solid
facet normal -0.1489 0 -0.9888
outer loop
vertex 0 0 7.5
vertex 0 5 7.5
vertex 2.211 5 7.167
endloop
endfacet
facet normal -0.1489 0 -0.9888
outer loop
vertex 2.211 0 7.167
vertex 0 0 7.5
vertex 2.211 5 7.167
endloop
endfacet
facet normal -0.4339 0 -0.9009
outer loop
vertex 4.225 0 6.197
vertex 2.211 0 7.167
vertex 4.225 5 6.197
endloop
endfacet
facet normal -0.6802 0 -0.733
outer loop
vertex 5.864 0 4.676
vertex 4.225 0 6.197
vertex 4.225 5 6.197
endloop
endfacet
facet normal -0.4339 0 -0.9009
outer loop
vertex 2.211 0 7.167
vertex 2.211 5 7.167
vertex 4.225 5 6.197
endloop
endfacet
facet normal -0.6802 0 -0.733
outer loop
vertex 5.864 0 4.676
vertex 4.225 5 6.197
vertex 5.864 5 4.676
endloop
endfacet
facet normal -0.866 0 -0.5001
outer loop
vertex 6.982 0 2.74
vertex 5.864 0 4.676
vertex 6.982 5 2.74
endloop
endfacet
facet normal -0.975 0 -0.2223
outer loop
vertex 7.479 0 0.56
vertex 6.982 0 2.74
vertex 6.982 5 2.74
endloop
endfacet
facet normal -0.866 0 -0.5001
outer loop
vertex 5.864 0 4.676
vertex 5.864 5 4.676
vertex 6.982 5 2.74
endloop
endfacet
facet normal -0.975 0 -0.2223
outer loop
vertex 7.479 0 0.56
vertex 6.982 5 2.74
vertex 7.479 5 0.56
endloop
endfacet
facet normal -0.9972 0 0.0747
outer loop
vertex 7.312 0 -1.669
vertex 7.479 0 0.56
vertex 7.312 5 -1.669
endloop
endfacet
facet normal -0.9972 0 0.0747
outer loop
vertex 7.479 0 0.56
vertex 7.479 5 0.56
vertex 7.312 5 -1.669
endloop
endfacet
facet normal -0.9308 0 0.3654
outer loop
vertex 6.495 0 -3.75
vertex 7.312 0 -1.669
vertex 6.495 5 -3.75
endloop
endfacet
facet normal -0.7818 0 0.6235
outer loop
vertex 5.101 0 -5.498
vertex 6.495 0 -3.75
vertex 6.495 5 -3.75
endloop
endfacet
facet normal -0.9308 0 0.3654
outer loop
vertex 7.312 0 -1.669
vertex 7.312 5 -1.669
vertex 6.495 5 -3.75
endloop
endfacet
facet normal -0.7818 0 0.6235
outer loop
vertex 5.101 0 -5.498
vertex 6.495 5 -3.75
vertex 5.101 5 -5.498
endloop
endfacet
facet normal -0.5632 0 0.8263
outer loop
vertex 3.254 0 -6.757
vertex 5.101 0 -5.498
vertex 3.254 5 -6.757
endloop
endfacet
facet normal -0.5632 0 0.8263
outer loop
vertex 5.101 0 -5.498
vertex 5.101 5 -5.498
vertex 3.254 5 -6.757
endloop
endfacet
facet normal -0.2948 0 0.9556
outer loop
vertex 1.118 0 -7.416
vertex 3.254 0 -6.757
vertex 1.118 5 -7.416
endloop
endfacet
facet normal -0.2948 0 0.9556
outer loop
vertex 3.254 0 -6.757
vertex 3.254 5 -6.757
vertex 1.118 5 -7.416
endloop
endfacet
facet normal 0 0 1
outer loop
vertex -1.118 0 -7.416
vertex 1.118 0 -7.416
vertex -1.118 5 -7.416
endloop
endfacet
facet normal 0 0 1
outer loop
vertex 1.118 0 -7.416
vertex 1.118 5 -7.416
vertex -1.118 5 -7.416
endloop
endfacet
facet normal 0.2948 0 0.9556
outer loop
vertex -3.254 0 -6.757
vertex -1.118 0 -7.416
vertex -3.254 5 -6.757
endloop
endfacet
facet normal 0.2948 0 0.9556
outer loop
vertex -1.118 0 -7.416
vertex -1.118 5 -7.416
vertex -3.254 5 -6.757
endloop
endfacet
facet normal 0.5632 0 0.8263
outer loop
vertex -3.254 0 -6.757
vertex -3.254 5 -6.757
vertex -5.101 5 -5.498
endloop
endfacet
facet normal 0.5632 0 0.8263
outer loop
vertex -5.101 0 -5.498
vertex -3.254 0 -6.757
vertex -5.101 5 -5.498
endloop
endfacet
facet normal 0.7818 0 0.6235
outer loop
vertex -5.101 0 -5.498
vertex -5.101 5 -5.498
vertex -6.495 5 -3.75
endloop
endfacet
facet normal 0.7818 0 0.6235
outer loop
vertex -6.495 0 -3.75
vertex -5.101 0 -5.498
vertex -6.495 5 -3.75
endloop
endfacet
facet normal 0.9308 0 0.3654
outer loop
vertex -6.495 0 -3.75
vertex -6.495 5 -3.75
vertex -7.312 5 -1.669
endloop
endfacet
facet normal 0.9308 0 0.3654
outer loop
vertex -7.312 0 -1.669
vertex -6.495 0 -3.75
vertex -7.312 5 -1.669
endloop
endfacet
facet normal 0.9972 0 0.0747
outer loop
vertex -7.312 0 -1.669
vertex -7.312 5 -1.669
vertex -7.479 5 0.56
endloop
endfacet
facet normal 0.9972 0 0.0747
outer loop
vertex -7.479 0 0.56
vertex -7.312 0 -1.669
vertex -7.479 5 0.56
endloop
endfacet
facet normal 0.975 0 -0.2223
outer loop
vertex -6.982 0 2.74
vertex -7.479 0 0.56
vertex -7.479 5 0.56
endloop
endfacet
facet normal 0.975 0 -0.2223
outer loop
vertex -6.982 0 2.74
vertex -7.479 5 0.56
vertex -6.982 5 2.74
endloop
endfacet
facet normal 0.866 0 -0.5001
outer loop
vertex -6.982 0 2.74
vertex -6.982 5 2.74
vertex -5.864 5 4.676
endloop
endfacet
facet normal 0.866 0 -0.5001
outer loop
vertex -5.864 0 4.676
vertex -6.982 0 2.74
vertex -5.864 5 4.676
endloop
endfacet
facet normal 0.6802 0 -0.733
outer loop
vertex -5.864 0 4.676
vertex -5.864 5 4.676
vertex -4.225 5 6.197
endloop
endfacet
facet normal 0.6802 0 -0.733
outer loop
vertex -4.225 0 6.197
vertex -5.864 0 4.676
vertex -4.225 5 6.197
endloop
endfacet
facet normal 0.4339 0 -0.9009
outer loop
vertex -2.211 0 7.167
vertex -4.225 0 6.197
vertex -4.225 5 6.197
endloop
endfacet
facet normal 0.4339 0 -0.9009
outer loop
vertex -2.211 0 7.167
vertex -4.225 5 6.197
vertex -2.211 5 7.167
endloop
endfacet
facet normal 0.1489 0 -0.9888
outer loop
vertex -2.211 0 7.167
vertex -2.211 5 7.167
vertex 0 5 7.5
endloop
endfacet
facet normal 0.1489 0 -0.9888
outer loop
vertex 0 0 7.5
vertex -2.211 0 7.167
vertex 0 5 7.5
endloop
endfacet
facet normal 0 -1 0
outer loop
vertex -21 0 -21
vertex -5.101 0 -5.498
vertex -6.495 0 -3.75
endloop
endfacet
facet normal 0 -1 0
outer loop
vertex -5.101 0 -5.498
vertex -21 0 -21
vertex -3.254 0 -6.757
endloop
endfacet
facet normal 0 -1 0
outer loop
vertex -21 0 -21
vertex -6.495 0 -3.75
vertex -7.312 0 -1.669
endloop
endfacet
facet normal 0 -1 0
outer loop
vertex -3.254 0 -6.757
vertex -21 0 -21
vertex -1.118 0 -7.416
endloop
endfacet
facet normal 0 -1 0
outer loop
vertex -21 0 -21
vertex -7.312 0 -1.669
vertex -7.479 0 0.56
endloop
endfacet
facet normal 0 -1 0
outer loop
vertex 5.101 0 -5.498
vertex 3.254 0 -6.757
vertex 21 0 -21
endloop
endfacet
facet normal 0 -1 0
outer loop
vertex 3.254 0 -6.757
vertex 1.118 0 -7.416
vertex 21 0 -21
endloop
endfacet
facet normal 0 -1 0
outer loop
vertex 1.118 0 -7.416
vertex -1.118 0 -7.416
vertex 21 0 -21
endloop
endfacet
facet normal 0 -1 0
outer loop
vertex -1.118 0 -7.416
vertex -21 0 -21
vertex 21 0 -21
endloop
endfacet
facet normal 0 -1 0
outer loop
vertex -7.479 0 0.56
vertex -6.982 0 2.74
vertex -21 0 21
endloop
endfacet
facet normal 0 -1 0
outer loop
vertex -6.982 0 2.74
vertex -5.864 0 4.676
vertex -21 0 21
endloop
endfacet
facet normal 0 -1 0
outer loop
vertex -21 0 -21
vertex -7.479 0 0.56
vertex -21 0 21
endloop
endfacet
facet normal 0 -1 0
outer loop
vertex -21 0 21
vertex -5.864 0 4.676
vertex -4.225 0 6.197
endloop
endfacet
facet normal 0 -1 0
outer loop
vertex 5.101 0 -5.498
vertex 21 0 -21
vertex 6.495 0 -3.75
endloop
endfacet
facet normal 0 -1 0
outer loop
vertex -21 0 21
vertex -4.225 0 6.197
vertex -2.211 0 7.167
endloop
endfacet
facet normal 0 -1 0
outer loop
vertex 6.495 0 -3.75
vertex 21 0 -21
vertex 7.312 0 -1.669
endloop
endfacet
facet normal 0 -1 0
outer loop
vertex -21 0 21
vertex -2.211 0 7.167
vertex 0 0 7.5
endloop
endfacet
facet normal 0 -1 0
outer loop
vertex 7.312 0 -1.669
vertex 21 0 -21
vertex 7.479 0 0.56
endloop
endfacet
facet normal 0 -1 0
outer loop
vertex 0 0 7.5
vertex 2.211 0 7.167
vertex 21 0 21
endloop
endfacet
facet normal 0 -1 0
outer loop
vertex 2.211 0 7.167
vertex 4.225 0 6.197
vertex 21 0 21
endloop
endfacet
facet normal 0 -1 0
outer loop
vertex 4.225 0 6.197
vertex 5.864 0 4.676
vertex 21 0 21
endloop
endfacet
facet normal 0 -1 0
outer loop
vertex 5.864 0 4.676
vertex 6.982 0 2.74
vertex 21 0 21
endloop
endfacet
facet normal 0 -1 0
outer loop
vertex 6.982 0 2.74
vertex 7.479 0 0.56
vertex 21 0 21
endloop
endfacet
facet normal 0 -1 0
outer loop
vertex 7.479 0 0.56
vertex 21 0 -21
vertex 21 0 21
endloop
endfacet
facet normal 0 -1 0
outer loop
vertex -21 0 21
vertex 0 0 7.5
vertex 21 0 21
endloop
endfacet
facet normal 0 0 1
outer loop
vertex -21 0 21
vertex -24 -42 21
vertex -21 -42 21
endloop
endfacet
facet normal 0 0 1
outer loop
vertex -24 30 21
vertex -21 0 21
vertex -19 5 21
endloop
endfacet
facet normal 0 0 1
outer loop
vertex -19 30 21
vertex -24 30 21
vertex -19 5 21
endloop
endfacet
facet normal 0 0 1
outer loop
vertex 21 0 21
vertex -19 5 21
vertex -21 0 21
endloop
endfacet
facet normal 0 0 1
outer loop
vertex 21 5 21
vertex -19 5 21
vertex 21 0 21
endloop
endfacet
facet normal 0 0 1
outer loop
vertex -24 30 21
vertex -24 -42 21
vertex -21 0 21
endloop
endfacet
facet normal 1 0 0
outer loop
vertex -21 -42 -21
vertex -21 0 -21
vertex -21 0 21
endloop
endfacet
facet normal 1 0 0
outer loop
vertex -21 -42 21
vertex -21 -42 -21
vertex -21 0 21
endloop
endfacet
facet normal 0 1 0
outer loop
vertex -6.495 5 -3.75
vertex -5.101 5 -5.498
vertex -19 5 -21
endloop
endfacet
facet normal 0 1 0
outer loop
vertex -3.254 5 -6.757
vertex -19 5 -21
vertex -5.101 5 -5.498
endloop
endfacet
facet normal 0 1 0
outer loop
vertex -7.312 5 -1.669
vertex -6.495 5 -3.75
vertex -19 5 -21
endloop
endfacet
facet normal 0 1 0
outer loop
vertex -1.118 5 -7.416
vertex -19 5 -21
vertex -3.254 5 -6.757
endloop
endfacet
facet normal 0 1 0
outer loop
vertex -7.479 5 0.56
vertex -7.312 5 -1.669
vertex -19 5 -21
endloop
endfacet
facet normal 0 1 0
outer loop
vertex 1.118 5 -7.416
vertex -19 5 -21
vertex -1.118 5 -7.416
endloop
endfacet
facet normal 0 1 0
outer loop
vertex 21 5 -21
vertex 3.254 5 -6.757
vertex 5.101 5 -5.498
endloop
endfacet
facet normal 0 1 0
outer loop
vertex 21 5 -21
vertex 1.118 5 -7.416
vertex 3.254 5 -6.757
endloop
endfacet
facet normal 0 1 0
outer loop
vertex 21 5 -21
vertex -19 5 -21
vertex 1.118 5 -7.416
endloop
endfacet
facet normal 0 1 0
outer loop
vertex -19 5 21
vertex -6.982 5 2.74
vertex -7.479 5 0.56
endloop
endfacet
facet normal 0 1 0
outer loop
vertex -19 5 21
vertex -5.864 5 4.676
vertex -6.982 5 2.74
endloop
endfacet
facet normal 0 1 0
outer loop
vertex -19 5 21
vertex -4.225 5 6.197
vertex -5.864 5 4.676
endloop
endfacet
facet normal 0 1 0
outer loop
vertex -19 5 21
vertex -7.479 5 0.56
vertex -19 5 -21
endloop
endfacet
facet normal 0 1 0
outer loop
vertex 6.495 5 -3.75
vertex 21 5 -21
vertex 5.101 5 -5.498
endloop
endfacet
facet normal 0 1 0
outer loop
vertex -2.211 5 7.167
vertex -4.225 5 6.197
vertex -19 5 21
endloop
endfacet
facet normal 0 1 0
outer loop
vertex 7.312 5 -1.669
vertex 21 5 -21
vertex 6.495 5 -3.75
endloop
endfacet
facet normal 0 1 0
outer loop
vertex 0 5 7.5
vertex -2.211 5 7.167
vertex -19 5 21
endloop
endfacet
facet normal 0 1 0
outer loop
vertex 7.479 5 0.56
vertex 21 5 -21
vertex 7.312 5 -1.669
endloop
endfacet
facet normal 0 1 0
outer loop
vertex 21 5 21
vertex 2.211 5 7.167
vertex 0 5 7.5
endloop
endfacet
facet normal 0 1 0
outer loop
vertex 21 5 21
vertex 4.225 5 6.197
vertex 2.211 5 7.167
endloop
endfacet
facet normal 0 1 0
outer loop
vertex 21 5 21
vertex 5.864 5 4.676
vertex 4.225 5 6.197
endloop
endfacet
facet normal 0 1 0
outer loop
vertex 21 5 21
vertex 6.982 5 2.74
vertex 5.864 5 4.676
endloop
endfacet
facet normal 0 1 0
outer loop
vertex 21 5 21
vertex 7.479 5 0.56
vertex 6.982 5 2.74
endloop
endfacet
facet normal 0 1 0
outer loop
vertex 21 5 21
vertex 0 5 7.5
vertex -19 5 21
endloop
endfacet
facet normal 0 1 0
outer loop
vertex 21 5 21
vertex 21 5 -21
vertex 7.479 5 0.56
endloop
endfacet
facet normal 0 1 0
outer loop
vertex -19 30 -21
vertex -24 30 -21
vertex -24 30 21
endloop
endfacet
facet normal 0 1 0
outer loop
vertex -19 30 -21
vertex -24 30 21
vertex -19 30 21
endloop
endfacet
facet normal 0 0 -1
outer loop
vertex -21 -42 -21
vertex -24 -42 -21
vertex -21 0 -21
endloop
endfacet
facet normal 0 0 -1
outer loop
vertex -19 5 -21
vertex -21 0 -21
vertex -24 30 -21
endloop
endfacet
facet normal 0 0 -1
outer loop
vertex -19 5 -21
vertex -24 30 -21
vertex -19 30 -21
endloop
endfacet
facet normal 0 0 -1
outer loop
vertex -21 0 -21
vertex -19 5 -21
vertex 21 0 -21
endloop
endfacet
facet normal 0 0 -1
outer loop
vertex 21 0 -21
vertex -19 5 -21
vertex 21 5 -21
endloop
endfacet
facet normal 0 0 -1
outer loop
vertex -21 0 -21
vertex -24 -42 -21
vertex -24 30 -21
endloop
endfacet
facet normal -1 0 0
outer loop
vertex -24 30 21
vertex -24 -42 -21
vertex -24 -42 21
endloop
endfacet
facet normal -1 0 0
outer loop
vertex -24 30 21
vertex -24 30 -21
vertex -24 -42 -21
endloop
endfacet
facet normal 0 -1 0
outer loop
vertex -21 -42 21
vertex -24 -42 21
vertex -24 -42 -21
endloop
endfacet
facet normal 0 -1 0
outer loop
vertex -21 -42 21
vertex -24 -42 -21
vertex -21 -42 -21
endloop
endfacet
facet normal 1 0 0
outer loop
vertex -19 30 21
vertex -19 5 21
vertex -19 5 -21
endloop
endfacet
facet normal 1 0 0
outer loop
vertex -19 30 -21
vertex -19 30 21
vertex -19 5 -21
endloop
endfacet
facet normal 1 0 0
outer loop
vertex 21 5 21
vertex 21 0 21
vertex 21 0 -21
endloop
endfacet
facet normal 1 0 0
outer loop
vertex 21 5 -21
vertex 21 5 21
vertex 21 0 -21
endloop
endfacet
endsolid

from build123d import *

# Parameters (mm, degrees)
SKETCH_1_W          = 42
SKETCH_1_H          = 42
EXTRUDE_1_DEPTH     = 5
SKETCH_2_W          = 42
SKETCH_2_H          = 5
EXTRUDE_2_DEPTH     = 3
SKETCH_4_W          = 5
SKETCH_4_H          = 42
EXTRUDE_3_DEPTH     = 25
SKETCH_5_W          = 3
SKETCH_5_H          = 42
EXTRUDE_4_DEPTH     = 42
SKETCH_8_R          = 7.5
CUT_EXTRUDE_1_DEPTH = 25


with BuildPart() as part:
    # 草图1 → 凸台-拉伸1 (new body)
    with BuildSketch(Plane(origin=(0, 0, 0), x_dir=(1, 0, 0), z_dir=(0, 1, 0))):
        Rectangle(SKETCH_1_W, SKETCH_1_H)
    extrude(amount=EXTRUDE_1_DEPTH)

    # 草图2 → 凸台-拉伸2 (add)
    with BuildSketch(Plane.ZY.offset(21)):
        with Locations((0, 2.5)):
            Rectangle(SKETCH_2_W, SKETCH_2_H)
    extrude(amount=EXTRUDE_2_DEPTH)

    # 草图4 → 凸台-拉伸3 (add)
    with BuildSketch(Plane(origin=(0, 5, 0), x_dir=(1, 0, 0), z_dir=(0, 1, 0))):
        with Locations((-21.5, 0)):
            Rectangle(SKETCH_4_W, SKETCH_4_H)
    extrude(amount=EXTRUDE_3_DEPTH)

    # 草图5 → 凸台-拉伸4 (add)
    with BuildSketch(Plane.XZ):
        with Locations((-22.5, 0)):
            Rectangle(SKETCH_5_W, SKETCH_5_H)
    extrude(amount=EXTRUDE_4_DEPTH)

    # 草图8 → 切除-拉伸1 (cut)
    with BuildSketch(Plane(origin=(0, 5, 0), x_dir=(1, 0, 0), z_dir=(0, 1, 0))):
        with Locations(Location((0, 0, 0), (0, 0, 270))):
            Circle(SKETCH_8_R)
    extrude(amount=-CUT_EXTRUDE_1_DEPTH, mode=Mode.SUBTRACT)


solid = part.part
